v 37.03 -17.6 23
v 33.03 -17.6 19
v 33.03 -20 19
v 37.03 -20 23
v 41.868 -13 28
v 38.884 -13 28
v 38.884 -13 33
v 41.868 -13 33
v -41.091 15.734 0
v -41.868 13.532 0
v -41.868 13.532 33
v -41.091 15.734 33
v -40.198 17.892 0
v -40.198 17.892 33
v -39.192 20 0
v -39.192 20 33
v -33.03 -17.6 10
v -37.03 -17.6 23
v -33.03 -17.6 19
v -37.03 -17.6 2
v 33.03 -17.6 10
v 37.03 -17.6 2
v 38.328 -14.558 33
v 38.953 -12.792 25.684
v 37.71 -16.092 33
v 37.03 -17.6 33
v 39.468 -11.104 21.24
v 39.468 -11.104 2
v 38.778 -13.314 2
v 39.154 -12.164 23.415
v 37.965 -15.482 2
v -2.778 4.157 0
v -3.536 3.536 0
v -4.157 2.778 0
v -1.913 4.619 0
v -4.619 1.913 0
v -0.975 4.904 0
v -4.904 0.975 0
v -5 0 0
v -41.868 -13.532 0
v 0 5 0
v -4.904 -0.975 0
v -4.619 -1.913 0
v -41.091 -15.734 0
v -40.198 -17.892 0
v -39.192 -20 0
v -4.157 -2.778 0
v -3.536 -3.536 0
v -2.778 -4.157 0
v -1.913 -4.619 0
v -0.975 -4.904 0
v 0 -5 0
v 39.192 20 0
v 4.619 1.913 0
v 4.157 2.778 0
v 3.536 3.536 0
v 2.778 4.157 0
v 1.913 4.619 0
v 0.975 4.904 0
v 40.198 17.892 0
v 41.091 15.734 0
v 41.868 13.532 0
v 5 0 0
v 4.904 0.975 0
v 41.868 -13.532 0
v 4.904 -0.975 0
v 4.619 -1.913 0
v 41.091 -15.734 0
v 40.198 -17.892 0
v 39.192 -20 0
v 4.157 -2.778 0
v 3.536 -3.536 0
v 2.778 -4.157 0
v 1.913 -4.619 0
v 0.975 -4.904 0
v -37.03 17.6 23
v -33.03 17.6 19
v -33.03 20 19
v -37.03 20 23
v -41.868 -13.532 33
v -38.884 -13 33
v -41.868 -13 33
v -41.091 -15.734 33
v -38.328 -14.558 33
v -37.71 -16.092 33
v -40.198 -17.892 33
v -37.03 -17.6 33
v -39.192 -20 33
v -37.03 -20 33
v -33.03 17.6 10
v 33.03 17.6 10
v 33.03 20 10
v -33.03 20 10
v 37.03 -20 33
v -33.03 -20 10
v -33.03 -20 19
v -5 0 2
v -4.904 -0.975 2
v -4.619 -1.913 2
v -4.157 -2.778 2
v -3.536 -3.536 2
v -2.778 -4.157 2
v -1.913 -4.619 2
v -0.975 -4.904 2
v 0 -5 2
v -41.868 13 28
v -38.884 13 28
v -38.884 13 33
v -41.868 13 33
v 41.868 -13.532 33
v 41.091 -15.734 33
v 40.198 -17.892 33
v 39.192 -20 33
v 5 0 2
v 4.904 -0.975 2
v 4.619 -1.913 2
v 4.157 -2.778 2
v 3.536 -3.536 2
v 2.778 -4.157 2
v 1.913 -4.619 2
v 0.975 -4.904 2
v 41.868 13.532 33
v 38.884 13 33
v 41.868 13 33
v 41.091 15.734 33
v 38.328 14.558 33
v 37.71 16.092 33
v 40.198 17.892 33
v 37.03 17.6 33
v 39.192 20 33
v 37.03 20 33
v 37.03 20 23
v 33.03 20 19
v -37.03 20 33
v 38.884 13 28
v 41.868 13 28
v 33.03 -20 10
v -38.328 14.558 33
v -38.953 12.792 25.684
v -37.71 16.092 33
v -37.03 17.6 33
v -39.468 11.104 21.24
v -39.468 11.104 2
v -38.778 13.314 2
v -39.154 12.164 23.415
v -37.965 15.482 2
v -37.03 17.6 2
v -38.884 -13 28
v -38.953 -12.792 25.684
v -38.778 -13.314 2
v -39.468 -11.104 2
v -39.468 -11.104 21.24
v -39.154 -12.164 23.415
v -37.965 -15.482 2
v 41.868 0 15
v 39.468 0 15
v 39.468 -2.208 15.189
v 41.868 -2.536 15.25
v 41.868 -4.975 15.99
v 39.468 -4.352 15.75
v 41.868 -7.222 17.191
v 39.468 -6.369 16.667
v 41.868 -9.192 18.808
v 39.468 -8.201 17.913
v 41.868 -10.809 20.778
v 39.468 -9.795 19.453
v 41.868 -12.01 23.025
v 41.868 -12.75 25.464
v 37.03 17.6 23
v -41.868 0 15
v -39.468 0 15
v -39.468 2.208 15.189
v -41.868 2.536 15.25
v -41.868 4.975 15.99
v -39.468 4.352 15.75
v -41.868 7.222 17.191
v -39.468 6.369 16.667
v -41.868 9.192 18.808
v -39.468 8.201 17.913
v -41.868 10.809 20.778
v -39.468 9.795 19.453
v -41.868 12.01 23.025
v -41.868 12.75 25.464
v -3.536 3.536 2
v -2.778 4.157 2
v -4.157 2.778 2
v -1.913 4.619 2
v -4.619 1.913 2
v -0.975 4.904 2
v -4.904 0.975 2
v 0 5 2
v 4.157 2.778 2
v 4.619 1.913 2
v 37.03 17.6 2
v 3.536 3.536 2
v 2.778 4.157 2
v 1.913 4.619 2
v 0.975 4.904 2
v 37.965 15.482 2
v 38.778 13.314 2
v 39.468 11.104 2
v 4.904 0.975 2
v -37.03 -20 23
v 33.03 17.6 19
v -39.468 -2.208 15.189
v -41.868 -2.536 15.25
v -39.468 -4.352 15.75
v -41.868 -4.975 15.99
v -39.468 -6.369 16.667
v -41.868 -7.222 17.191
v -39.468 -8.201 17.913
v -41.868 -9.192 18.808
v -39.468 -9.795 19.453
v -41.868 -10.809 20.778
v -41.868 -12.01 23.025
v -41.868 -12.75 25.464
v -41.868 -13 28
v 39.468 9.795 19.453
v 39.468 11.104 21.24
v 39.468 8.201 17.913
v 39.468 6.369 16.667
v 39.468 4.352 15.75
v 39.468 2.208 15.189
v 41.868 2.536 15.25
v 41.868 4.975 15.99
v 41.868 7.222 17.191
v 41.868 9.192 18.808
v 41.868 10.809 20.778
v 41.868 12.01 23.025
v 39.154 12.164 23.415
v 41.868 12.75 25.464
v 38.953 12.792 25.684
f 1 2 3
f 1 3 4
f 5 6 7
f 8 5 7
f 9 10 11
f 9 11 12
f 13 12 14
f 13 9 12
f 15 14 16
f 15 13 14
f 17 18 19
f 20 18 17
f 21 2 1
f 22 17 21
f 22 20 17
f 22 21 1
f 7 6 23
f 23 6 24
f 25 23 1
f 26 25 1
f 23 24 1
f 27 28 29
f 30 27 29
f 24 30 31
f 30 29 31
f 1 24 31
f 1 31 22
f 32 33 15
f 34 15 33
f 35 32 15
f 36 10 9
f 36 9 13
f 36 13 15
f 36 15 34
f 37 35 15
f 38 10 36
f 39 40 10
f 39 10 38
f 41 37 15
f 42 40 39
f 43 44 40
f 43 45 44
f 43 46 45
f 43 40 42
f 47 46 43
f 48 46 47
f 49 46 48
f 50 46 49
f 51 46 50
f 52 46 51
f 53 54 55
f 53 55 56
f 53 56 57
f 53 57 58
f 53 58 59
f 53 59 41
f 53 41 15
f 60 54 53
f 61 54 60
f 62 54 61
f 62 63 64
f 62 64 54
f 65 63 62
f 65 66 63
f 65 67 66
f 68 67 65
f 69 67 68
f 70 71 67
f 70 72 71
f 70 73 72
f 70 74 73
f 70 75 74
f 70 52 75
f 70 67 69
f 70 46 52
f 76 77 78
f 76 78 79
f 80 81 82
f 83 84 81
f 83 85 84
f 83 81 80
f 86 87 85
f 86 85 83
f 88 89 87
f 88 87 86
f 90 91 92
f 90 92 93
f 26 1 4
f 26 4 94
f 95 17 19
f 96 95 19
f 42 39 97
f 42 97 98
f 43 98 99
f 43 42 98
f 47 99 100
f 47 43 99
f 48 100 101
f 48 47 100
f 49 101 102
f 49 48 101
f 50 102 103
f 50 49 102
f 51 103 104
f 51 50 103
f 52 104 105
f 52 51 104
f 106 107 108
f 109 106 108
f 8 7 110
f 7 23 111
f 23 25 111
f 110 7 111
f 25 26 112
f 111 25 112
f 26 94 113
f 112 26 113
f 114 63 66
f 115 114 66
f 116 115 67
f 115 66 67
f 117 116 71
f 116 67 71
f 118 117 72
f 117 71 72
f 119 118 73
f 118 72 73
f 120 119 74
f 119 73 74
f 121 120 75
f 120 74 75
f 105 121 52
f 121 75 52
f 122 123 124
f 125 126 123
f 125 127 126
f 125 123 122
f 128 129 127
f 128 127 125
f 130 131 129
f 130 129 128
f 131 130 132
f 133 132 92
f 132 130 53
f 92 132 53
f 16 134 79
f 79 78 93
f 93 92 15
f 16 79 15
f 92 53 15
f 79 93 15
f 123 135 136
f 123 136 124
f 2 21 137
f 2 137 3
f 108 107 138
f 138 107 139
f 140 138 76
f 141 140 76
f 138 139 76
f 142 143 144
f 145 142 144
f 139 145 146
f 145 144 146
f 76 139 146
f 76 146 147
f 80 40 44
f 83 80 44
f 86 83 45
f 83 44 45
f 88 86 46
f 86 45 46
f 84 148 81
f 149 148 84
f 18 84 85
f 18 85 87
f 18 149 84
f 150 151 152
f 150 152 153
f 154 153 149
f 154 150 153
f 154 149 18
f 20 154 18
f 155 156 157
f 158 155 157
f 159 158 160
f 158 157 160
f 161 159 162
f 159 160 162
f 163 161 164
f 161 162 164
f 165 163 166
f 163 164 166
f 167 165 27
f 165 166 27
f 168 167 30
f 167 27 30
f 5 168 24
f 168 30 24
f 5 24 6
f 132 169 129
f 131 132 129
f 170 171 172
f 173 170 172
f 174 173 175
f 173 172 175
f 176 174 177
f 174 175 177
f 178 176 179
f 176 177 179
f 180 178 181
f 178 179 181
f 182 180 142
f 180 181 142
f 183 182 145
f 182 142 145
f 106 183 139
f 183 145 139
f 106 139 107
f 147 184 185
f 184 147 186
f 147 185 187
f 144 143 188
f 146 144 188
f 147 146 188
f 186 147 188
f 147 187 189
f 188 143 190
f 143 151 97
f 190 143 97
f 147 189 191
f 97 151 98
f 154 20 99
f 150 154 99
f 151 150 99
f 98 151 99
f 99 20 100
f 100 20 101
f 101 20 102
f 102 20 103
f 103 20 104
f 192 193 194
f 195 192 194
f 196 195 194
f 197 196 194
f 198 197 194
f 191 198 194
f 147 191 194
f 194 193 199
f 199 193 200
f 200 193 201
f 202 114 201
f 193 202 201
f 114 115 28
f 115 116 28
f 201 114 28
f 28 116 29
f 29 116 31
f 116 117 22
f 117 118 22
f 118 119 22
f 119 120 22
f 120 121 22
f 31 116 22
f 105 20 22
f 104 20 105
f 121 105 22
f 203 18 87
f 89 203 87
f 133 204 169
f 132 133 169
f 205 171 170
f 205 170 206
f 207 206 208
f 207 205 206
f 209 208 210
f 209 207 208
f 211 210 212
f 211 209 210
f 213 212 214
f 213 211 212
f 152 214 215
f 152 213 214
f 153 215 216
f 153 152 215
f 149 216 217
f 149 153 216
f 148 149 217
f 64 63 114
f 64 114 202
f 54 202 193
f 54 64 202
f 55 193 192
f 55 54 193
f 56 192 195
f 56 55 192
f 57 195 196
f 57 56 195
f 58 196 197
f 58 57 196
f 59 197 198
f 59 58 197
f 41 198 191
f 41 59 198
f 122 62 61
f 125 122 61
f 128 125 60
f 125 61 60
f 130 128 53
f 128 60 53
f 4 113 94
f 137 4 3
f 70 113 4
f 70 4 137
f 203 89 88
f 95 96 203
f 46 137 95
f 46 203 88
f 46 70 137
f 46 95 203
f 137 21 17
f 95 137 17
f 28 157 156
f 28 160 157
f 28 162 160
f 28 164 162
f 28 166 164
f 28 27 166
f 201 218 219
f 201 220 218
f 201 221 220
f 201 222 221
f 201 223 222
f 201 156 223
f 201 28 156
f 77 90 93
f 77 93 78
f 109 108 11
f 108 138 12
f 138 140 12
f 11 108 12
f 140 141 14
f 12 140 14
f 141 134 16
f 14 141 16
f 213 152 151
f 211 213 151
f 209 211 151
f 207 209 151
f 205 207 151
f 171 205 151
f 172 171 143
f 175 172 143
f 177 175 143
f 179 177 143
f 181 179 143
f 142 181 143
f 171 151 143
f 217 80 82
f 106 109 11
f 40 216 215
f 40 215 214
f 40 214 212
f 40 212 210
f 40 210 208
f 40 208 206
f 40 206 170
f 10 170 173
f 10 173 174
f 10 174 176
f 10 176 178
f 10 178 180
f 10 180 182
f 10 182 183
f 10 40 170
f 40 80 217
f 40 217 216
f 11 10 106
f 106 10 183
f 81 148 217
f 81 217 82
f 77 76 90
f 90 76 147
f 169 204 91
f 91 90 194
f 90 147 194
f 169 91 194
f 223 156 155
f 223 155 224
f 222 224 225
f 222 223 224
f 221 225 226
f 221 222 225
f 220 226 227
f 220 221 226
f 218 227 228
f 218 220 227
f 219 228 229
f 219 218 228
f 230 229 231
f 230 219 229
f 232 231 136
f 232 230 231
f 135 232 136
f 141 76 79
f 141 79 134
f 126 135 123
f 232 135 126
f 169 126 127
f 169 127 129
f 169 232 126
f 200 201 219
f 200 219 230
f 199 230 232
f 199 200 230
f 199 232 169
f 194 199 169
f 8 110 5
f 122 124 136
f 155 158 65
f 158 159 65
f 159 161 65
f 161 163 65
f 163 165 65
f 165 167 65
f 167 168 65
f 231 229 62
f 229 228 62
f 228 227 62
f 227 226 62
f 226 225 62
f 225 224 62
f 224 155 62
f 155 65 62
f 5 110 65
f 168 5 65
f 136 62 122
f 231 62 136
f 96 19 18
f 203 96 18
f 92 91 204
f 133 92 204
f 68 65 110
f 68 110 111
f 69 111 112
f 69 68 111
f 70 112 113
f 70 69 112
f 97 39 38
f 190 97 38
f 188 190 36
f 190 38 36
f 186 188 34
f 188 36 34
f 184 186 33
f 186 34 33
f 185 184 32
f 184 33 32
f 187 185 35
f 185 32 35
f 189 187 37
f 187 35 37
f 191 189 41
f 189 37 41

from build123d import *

# Parameters (mm, degrees)
PAD_DEPTH                  = 2
PAD001_DEPTH               = 33
POCKET_DEPTH               = 133.8763
POCKET001_DEPTH            = 155.7439
PAD_MIRRORED_2_DEPTH       = 2
PAD001_MIRRORED_2_DEPTH    = 33
POCKET_MIRRORED_2_DEPTH    = 133.8763
POCKET001_MIRRORED_2_DEPTH = 155.7439


with BuildPart() as part:
    # Sketch → Pad (new body)
    with BuildSketch(Plane.XY):
        with BuildLine():
            ThreePointArc((5, 0), (3.535534, 3.535534), (0, 5))
            Line((0, 5), (0, 20))
            Line((0, 20), (39.191836, 20))
            ThreePointArc((41.867601, 13.531593), (40.658555, 16.819092), (39.191836, 20))
            Line((41.867601, 13.531593), (41.867601, 0))
            Line((41.867601, 0), (5, 0))
        make_face()
    pad = extrude(amount=PAD_DEPTH)

    # Sketch001 → Pad001 (join)
    with BuildSketch(Plane.XY):
        with BuildLine():
            ThreePointArc((41.867601, 13.531593), (40.658555, 16.819092), (39.191836, 20))
            Line((0, 20), (39.191836, 20))
            Line((0, 17.6), (0, 20))
            Line((37.030258, 17.6), (0, 17.6))
            ThreePointArc((39.467601, 11.104436), (38.386569, 14.403865), (37.030258, 17.6))
            Line((39.467601, 11.104436), (39.467601, 0))
            Line((39.467601, 0), (41.867601, 0))
            Line((41.867601, 0), (41.867601, 13.531593))
        make_face()
    pad001 = extrude(amount=PAD001_DEPTH)

    # Sketch002 → Pocket (cut, through all)
    with BuildSketch(Plane.XZ):
        Polygon((0, 10), (33.030258, 10), (33.030258, 19), (37.030258, 23), (37.030258, 33), (0, 33), align=None)
    pocket = extrude(amount=-POCKET_DEPTH, mode=Mode.SUBTRACT)

    # Sketch003 → Pocket001 (cut, through all)
    with BuildSketch(Plane.YZ):
        with BuildLine():
            Line((0, 15.000035), (0, 33))
            Line((0, 33), (13, 33))
            Line((13, 28), (13, 33))
            ThreePointArc((0, 15.000035), (9.192376, 18.807634), (13, 28))
        make_face()
    pocket001 = extrude(amount=POCKET001_DEPTH, mode=Mode.SUBTRACT)

    # Sketch Mirrored 2 → Pad Mirrored 2 (add)
    with BuildSketch(Plane(origin=(0, 0, 0), x_dir=(-1, 0, 0), z_dir=(0, 0, -1))):
        with BuildLine():
            ThreePointArc((5, 0), (3.535534, 3.535534), (0, 5))
            Line((0, 5), (0, 20))
            Line((0, 20), (39.191836, 20))
            ThreePointArc((41.867601, 13.531593), (40.658555, 16.819092), (39.191836, 20))
            Line((41.867601, 13.531593), (41.867601, 0))
            Line((41.867601, 0), (5, 0))
        make_face()
    pad_mirrored_2 = extrude(amount=-PAD_MIRRORED_2_DEPTH)

    # Sketch001 Mirrored 2 → Pad001 Mirrored 2 (add)
    with BuildSketch(Plane(origin=(0, 0, 0), x_dir=(-1, 0, 0), z_dir=(0, 0, -1))):
        with BuildLine():
            ThreePointArc((41.867601, 13.531593), (40.658555, 16.819092), (39.191836, 20))
            Line((0, 20), (39.191836, 20))
            Line((0, 17.6), (0, 20))
            Line((37.030258, 17.6), (0, 17.6))
            ThreePointArc((39.467601, 11.104436), (38.386569, 14.403865), (37.030258, 17.6))
            Line((39.467601, 11.104436), (39.467601, 0))
            Line((39.467601, 0), (41.867601, 0))
            Line((41.867601, 0), (41.867601, 13.531593))
        make_face()
    pad001_mirrored_2 = extrude(amount=-PAD001_MIRRORED_2_DEPTH)

    # Sketch002 Mirrored 2 → Pocket Mirrored 2 (cut, through all)
    with BuildSketch(Plane(origin=(0, 0, 0), x_dir=(-1, 0, 0), z_dir=(0, 1, 0))):
        Polygon((0, 10), (33.030258, 10), (33.030258, 19), (37.030258, 23), (37.030258, 33), (0, 33), align=None)
    pocket_mirrored_2 = extrude(amount=POCKET_MIRRORED_2_DEPTH, mode=Mode.SUBTRACT)

    # Sketch003 Mirrored 2 → Pocket001 Mirrored 2 (cut, through all)
    with BuildSketch(Plane.YZ):
        with BuildLine():
            Line((0, 15.000035), (0, 33))
            Line((0, 33), (13, 33))
            Line((13, 28), (13, 33))
            ThreePointArc((0, 15.000035), (9.192376, 18.807634), (13, 28))
        make_face()
    pocket001_mirrored_2 = extrude(amount=-POCKET001_MIRRORED_2_DEPTH, mode=Mode.SUBTRACT)

    # Mirrored001: Pad, Pad001, Pocket, Pocket001, Pad Mirrored 2, Pad001 Mirrored 2, Pocket Mirrored 2, Pocket001 Mirrored 2 across Sketch H_Axis
    add(pad.mirror(Plane.ZX))
    add(pad001.mirror(Plane.ZX))
    add(pocket.mirror(Plane.ZX), mode=Mode.SUBTRACT)
    add(pocket001.mirror(Plane.ZX), mode=Mode.SUBTRACT)
    add(pad_mirrored_2.mirror(Plane.ZX))
    add(pad001_mirrored_2.mirror(Plane.ZX))
    add(pocket_mirrored_2.mirror(Plane.ZX), mode=Mode.SUBTRACT)
    add(pocket001_mirrored_2.mirror(Plane.ZX), mode=Mode.SUBTRACT)


solid = part.part
